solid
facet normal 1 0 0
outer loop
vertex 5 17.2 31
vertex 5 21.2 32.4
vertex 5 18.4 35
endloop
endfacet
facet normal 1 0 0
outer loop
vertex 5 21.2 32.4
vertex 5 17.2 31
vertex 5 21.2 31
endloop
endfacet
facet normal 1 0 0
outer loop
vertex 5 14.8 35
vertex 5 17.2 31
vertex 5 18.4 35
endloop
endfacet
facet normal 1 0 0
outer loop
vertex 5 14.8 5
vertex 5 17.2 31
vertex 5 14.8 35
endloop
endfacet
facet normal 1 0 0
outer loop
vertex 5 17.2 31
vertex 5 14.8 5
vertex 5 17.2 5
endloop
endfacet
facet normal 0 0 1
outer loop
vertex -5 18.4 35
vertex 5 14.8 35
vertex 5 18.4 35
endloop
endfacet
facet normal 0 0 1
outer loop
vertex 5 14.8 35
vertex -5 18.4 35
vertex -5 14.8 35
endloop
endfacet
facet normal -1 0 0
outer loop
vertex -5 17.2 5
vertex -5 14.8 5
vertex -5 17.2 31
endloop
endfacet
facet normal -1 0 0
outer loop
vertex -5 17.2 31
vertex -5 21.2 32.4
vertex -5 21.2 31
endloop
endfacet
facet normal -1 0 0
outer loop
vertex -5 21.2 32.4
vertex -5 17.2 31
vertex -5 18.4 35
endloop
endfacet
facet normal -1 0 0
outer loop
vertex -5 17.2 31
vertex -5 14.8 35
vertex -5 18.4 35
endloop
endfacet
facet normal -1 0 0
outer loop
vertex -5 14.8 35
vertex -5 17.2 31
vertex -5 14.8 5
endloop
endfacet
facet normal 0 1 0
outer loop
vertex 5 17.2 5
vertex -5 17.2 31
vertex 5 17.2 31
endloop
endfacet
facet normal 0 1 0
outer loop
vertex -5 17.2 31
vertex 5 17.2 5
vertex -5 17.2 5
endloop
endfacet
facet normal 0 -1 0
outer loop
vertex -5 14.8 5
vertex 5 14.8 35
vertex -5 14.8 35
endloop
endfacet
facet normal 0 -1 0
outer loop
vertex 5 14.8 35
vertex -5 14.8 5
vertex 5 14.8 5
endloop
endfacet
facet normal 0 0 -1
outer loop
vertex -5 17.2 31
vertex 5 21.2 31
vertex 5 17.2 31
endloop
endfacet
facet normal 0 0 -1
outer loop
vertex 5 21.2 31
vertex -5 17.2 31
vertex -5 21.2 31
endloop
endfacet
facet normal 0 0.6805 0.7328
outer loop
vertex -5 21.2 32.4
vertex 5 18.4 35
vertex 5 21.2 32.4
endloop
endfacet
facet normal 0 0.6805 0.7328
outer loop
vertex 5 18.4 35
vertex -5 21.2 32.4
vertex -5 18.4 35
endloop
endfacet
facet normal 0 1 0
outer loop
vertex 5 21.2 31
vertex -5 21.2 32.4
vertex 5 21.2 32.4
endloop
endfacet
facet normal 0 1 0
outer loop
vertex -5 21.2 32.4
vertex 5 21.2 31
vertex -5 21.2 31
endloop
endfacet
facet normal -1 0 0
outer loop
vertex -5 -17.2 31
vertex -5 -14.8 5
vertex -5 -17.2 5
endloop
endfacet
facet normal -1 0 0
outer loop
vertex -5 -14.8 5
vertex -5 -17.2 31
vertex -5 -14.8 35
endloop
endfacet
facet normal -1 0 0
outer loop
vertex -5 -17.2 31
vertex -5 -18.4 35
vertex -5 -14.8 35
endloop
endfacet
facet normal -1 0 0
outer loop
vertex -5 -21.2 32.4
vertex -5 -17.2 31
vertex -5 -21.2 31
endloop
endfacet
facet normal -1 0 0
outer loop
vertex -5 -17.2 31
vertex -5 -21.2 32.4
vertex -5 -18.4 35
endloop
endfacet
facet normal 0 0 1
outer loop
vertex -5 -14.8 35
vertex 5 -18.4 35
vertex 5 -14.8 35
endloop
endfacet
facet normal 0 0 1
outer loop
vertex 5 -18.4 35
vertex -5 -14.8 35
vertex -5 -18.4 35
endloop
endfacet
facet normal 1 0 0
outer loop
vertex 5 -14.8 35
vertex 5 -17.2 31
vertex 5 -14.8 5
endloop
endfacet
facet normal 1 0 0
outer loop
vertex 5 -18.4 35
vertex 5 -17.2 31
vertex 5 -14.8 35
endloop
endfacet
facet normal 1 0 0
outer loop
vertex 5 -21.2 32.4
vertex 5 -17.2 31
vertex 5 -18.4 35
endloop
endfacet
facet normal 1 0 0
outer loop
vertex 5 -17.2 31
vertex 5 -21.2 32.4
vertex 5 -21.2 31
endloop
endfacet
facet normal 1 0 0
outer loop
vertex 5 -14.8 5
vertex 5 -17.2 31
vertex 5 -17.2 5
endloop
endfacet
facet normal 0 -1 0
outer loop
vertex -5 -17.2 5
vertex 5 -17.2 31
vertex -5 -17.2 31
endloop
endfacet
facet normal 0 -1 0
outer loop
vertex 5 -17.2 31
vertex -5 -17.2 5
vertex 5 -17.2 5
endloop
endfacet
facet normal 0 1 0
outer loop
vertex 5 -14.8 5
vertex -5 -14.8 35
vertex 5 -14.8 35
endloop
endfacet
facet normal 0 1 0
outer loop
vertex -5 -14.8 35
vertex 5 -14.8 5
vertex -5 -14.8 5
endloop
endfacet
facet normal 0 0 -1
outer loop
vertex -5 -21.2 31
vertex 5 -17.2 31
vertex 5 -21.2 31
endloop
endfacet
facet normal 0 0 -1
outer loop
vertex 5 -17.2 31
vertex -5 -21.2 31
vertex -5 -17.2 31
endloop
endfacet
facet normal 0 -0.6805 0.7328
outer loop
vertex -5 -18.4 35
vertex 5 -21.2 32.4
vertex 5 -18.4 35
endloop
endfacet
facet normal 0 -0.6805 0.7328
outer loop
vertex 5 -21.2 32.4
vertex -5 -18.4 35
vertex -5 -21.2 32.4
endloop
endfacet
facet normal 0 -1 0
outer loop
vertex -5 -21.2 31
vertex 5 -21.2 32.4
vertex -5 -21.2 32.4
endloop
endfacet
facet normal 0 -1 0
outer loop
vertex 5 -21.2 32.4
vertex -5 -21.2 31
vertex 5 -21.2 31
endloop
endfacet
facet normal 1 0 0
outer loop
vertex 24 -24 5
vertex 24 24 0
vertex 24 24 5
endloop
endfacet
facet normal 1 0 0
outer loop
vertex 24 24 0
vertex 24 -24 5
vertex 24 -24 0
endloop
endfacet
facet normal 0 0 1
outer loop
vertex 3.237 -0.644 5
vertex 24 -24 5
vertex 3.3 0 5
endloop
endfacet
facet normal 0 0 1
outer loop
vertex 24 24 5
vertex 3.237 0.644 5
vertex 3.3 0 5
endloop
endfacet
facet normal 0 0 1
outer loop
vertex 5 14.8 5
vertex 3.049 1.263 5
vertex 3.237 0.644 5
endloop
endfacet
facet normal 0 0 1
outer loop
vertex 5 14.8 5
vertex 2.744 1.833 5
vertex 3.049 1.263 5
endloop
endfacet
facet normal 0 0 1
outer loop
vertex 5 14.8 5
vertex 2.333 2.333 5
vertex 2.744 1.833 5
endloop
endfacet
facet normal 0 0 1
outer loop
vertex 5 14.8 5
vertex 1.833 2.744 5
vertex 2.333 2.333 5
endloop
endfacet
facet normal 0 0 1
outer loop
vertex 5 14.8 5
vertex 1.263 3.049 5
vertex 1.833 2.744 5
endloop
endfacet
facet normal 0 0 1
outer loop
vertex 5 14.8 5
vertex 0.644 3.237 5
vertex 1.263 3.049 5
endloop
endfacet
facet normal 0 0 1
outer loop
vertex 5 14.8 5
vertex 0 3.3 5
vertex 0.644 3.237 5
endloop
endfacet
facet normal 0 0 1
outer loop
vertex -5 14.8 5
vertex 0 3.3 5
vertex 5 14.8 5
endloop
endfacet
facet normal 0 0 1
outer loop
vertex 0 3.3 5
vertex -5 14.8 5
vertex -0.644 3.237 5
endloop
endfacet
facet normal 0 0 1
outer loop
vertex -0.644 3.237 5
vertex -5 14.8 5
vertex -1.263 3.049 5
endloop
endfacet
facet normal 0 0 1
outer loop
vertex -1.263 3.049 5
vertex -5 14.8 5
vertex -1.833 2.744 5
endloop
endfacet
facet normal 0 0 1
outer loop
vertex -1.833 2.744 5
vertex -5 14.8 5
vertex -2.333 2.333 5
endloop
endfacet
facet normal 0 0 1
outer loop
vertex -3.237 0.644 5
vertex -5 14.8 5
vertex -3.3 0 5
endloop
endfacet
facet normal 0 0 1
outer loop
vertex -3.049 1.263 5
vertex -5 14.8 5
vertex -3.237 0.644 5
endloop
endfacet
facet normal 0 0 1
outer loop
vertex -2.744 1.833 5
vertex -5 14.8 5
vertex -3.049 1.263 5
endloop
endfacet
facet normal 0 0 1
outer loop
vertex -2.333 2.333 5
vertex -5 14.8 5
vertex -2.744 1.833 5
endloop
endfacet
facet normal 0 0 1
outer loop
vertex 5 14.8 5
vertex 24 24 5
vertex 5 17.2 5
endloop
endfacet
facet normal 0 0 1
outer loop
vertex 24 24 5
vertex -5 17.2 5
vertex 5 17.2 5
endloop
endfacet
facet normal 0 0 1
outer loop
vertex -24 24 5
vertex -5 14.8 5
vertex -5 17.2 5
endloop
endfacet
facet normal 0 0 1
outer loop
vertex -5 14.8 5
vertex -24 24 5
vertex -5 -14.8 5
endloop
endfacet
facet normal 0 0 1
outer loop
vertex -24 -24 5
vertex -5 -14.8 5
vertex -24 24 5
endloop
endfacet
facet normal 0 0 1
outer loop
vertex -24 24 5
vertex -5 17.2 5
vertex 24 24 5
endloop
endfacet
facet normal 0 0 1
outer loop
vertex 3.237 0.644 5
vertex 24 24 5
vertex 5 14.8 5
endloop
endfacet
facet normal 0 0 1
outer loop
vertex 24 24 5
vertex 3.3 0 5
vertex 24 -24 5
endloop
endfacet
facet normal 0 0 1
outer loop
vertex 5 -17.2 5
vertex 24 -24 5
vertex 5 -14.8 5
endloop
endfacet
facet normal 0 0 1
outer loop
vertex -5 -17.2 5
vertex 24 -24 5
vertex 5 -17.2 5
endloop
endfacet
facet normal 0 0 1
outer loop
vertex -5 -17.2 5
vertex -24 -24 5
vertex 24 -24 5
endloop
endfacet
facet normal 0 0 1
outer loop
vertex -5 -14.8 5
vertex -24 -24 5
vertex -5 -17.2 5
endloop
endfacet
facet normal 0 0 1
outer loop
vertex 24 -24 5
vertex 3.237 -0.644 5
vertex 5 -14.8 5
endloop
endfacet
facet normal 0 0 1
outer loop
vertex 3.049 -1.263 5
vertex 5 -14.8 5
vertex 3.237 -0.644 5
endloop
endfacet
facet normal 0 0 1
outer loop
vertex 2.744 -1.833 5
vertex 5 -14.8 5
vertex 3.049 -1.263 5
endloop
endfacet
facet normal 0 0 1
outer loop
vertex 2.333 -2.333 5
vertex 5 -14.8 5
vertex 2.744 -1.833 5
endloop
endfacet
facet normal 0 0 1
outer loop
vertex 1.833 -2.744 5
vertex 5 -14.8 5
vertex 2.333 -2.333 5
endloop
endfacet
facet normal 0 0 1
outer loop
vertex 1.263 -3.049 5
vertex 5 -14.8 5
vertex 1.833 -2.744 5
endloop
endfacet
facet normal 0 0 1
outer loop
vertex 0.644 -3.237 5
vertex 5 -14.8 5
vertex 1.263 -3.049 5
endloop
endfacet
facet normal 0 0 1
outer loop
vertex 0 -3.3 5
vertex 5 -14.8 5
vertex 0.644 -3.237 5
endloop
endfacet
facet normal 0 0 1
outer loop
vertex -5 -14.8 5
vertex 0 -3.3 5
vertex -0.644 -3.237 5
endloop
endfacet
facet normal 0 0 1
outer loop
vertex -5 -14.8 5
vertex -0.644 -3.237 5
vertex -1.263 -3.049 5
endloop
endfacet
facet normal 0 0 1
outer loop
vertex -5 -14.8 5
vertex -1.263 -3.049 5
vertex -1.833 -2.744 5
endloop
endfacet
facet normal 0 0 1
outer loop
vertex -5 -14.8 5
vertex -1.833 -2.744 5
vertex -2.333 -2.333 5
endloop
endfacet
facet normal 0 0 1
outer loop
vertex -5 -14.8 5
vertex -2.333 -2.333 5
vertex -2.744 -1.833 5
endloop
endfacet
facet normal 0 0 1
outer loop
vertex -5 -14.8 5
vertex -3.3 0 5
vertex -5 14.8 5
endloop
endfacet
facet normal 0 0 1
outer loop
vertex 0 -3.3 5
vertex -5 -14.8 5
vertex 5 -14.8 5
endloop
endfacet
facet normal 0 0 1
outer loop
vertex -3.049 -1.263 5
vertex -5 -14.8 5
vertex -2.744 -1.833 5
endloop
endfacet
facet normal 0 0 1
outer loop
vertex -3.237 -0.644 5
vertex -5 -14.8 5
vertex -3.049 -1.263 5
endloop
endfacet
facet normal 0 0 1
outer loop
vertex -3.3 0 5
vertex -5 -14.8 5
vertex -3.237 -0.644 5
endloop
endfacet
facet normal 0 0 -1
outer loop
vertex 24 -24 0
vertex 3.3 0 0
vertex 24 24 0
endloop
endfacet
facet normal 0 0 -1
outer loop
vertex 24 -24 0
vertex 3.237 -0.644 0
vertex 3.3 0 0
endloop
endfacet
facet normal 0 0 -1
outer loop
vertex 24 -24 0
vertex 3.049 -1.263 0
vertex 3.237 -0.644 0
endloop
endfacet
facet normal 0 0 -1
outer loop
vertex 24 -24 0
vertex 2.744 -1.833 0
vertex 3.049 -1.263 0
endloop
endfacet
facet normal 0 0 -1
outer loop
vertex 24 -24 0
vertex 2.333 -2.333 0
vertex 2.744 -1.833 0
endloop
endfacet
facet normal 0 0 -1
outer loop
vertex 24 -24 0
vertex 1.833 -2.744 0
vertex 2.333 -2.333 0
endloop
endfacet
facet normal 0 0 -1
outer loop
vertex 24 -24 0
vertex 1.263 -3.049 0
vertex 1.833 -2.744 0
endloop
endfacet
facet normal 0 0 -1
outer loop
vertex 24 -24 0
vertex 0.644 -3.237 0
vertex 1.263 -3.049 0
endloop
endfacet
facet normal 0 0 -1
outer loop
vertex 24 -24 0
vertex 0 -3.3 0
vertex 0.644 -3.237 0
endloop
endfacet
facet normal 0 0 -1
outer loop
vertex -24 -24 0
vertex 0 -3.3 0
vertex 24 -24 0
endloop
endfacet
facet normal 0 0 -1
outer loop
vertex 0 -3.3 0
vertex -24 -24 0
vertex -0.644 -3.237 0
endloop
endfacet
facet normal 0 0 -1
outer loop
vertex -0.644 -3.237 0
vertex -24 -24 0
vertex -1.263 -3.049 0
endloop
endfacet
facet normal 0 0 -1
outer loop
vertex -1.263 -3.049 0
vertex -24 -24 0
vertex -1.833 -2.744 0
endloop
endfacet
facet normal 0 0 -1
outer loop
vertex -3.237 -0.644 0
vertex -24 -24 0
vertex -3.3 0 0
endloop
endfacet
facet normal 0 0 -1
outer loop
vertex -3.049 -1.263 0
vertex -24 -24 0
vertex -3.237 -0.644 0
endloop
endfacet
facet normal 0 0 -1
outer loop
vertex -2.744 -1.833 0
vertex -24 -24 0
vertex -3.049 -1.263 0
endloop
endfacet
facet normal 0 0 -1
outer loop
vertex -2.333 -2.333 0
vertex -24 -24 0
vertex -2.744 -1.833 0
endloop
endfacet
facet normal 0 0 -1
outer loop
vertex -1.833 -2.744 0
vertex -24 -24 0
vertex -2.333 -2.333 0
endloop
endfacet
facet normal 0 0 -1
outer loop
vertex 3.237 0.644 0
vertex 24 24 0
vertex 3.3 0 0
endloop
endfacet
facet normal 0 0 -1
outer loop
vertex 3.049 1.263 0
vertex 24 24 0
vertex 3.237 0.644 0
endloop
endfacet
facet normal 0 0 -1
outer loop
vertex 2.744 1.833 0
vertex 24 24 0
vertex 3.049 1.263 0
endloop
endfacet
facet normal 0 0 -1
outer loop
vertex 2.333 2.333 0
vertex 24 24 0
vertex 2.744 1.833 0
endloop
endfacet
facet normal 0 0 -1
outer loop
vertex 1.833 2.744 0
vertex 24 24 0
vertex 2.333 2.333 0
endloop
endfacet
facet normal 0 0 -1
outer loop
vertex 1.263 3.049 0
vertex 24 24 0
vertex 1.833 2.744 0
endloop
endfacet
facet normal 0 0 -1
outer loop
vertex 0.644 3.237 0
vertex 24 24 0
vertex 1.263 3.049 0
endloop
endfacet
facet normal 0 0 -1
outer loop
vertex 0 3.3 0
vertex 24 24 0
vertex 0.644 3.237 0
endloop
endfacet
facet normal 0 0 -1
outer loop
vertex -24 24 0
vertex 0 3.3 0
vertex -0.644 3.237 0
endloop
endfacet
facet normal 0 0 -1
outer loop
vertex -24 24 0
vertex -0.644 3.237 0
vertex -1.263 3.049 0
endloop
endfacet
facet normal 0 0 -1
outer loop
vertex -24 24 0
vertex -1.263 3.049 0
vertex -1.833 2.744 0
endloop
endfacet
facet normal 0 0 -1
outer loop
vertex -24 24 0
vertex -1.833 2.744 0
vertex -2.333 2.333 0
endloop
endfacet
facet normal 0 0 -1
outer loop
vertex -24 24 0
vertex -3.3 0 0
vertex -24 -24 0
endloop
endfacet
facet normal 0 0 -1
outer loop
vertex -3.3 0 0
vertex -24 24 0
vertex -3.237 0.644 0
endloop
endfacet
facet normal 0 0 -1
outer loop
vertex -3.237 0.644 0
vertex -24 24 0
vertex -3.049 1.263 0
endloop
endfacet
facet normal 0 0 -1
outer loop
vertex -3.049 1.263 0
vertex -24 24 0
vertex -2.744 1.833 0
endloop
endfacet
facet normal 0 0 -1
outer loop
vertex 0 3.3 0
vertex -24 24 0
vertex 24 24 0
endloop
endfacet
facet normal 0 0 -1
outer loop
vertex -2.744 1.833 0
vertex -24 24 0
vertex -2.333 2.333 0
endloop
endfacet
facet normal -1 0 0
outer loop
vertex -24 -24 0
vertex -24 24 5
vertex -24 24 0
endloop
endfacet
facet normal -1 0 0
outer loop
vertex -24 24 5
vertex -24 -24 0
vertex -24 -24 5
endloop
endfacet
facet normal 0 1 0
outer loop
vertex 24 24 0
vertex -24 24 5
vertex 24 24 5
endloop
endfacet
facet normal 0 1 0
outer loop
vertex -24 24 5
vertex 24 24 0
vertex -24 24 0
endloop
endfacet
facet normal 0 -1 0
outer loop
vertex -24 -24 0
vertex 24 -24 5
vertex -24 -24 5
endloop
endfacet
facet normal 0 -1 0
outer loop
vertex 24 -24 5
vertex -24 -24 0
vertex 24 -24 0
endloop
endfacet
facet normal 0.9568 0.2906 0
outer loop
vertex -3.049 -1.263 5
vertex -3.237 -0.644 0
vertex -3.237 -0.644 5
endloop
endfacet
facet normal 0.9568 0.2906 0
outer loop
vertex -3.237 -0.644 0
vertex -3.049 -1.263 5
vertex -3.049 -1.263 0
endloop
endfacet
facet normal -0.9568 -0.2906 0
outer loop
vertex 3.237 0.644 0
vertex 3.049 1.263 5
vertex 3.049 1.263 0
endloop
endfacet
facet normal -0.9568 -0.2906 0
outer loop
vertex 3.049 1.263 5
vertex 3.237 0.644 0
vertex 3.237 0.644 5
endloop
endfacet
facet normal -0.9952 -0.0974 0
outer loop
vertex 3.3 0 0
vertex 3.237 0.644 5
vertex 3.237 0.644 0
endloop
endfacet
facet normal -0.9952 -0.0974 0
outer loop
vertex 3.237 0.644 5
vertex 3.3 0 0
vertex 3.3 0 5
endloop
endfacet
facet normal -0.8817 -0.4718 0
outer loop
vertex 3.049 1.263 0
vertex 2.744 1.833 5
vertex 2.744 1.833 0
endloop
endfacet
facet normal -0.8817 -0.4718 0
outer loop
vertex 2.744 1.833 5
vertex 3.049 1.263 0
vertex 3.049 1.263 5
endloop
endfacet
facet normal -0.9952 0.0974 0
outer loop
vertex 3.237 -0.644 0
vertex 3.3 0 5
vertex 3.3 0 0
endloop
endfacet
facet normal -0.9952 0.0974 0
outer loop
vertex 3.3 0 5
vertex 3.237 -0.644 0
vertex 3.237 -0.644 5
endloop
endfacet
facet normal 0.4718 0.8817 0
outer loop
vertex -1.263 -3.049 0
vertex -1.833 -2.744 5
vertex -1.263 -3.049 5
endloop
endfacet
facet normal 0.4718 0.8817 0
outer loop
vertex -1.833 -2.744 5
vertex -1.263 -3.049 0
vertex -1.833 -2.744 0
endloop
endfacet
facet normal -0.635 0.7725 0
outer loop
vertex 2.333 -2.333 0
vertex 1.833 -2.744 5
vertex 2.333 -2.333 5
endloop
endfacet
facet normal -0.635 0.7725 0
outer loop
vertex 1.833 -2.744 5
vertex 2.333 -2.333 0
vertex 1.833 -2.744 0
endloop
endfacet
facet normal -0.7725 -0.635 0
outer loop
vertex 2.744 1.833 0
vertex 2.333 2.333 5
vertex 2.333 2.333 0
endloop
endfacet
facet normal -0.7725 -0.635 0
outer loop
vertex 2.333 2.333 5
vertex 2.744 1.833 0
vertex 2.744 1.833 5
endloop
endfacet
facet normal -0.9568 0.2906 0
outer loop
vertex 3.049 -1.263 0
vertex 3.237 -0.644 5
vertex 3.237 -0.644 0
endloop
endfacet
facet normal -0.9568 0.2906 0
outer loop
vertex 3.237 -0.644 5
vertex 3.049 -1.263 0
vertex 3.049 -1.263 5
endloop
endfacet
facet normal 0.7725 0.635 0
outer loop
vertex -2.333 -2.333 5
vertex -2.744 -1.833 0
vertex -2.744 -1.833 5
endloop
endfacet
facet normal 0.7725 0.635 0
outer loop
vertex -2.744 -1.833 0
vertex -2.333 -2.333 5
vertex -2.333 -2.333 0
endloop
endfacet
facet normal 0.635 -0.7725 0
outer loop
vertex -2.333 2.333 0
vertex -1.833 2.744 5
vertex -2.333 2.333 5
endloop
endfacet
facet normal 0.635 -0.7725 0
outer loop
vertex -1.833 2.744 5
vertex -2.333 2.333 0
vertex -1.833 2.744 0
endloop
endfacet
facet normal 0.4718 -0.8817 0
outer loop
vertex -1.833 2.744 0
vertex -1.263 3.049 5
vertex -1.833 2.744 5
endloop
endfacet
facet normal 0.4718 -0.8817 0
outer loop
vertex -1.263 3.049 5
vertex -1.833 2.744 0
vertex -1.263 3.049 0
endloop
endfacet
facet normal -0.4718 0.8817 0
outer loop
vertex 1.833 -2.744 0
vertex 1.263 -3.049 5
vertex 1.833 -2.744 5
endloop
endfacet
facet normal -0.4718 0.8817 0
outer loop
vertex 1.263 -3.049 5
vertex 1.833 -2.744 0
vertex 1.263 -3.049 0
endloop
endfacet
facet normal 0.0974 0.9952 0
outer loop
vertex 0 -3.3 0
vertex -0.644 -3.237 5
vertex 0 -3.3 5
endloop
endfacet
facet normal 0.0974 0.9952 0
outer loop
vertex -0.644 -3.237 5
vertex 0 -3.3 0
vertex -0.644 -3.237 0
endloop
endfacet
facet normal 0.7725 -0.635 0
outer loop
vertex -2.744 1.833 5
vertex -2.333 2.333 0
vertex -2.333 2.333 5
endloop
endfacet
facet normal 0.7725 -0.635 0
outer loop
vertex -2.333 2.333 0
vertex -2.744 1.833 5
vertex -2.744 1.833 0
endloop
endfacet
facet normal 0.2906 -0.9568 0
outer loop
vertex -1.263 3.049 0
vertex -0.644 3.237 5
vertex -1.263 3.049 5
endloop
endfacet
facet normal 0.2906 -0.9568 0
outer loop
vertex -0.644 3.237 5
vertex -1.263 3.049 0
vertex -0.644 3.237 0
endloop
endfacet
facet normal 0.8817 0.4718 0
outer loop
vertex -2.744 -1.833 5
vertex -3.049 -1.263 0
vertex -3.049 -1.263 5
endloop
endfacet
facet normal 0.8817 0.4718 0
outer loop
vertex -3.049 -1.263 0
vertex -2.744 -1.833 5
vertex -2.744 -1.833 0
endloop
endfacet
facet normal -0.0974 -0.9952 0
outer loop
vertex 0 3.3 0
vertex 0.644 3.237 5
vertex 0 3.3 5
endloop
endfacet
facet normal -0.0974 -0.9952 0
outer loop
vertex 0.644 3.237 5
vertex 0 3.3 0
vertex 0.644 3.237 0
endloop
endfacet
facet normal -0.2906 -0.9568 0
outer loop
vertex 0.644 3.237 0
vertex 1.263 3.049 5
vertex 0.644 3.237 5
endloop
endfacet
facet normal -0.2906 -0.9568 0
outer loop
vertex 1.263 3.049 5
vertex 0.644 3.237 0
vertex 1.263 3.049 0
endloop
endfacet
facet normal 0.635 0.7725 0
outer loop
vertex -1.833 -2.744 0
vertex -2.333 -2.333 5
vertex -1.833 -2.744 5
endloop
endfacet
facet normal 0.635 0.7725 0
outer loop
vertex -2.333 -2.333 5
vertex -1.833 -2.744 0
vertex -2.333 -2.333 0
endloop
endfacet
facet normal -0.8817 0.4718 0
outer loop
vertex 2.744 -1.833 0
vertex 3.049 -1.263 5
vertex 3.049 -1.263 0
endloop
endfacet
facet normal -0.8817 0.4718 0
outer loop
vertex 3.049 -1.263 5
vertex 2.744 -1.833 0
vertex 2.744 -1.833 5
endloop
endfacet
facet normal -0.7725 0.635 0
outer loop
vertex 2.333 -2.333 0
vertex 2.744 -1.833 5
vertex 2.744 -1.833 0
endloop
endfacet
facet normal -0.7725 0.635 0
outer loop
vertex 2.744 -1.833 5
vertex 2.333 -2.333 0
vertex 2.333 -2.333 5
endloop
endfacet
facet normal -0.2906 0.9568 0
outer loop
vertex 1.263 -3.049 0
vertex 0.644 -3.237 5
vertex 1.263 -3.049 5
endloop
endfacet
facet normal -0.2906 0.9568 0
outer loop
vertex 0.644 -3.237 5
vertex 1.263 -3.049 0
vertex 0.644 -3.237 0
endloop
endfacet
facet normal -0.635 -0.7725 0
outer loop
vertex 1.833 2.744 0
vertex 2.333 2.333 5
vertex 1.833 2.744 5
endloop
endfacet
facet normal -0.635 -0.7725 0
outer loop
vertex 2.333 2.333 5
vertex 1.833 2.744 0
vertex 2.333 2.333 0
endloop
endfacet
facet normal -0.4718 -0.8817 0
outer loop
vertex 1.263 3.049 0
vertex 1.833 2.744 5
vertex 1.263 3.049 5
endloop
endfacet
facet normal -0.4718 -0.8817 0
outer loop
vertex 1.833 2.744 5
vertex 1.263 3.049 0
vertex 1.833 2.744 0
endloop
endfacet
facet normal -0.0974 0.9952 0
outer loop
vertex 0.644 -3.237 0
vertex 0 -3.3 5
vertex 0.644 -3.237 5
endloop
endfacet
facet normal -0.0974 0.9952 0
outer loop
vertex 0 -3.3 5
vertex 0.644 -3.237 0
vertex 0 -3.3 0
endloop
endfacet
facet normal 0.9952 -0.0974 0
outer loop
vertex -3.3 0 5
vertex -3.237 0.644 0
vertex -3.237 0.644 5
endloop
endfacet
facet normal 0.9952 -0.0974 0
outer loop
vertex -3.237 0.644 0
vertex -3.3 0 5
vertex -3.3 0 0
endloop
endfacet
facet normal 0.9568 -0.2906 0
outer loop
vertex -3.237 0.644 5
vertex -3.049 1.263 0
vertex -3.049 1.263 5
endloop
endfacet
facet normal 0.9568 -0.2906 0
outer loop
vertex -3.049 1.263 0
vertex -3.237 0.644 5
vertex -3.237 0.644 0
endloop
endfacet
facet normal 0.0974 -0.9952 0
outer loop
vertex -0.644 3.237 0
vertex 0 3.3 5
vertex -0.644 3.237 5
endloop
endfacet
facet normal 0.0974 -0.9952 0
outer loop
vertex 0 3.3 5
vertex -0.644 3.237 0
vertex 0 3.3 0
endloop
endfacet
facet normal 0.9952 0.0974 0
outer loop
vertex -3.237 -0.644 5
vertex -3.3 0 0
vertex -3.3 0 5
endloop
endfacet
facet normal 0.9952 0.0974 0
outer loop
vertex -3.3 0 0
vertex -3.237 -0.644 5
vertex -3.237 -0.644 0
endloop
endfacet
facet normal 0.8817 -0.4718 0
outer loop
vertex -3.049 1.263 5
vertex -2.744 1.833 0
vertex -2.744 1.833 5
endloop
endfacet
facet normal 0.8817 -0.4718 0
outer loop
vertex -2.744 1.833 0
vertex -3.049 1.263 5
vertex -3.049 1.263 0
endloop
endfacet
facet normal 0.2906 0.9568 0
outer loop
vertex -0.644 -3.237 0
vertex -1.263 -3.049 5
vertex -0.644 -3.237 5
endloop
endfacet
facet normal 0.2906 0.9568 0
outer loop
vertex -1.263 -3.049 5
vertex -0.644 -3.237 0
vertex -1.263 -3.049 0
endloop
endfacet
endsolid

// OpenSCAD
$fn = 32;

// ----------------------------------------------------------------------
// Snap-fit latch: 2 arms, 30 mm tall, 4.2 mm undercut hooks
// ----------------------------------------------------------------------

// --- parameters (mm) ---
base_d = 48;              // base plate depth
base_h = 5;               // base plate thickness
span = 32;                // distance between opposite arms
arm_t = 2.4;              // arm thickness
arm_d = 10;               // arm width
height = 30;              // free arm length
head_len = 4.2;           // hook reach
head_h = 4;               // hook height
lead = 1.4;               // lead-in ramp thickness
bore_d = 6.6;             // base fixing bore
top_z = 35;               // height of the arm tips above the base

arms = 2;

difference() {
  union() {
    /* base plate, centred on the arm ring */
    translate([-24, -24, 0]) cube([base_d, base_d, base_h]);
    for (a = [0 : 360 / arms : 359]) rotate([0, 0, a]) {
    /* arm, sunk 0.5 mm into the base */
    translate([-arm_d / 2, span / 2 - arm_t / 2, base_h - 0.5]) cube([arm_d, arm_t, height + 0.5]);
    /* hook: a convex hull of a tall inner block and a thin outer lip
       gives a flat undercut below and a lead-in ramp on top */
    hull() {
      translate([-arm_d / 2, span / 2 + arm_t / 2 - 0.6, top_z - head_h]) cube([arm_d, lead + 0.4, head_h]);
      translate([-arm_d / 2, span / 2 + arm_t / 2 - 0.2, top_z - head_h]) cube([arm_d, head_len, lead]);
    }
    }
  }
  translate([0, 0, -2.5]) cylinder(h = base_h + 5, d = bore_d);
}
